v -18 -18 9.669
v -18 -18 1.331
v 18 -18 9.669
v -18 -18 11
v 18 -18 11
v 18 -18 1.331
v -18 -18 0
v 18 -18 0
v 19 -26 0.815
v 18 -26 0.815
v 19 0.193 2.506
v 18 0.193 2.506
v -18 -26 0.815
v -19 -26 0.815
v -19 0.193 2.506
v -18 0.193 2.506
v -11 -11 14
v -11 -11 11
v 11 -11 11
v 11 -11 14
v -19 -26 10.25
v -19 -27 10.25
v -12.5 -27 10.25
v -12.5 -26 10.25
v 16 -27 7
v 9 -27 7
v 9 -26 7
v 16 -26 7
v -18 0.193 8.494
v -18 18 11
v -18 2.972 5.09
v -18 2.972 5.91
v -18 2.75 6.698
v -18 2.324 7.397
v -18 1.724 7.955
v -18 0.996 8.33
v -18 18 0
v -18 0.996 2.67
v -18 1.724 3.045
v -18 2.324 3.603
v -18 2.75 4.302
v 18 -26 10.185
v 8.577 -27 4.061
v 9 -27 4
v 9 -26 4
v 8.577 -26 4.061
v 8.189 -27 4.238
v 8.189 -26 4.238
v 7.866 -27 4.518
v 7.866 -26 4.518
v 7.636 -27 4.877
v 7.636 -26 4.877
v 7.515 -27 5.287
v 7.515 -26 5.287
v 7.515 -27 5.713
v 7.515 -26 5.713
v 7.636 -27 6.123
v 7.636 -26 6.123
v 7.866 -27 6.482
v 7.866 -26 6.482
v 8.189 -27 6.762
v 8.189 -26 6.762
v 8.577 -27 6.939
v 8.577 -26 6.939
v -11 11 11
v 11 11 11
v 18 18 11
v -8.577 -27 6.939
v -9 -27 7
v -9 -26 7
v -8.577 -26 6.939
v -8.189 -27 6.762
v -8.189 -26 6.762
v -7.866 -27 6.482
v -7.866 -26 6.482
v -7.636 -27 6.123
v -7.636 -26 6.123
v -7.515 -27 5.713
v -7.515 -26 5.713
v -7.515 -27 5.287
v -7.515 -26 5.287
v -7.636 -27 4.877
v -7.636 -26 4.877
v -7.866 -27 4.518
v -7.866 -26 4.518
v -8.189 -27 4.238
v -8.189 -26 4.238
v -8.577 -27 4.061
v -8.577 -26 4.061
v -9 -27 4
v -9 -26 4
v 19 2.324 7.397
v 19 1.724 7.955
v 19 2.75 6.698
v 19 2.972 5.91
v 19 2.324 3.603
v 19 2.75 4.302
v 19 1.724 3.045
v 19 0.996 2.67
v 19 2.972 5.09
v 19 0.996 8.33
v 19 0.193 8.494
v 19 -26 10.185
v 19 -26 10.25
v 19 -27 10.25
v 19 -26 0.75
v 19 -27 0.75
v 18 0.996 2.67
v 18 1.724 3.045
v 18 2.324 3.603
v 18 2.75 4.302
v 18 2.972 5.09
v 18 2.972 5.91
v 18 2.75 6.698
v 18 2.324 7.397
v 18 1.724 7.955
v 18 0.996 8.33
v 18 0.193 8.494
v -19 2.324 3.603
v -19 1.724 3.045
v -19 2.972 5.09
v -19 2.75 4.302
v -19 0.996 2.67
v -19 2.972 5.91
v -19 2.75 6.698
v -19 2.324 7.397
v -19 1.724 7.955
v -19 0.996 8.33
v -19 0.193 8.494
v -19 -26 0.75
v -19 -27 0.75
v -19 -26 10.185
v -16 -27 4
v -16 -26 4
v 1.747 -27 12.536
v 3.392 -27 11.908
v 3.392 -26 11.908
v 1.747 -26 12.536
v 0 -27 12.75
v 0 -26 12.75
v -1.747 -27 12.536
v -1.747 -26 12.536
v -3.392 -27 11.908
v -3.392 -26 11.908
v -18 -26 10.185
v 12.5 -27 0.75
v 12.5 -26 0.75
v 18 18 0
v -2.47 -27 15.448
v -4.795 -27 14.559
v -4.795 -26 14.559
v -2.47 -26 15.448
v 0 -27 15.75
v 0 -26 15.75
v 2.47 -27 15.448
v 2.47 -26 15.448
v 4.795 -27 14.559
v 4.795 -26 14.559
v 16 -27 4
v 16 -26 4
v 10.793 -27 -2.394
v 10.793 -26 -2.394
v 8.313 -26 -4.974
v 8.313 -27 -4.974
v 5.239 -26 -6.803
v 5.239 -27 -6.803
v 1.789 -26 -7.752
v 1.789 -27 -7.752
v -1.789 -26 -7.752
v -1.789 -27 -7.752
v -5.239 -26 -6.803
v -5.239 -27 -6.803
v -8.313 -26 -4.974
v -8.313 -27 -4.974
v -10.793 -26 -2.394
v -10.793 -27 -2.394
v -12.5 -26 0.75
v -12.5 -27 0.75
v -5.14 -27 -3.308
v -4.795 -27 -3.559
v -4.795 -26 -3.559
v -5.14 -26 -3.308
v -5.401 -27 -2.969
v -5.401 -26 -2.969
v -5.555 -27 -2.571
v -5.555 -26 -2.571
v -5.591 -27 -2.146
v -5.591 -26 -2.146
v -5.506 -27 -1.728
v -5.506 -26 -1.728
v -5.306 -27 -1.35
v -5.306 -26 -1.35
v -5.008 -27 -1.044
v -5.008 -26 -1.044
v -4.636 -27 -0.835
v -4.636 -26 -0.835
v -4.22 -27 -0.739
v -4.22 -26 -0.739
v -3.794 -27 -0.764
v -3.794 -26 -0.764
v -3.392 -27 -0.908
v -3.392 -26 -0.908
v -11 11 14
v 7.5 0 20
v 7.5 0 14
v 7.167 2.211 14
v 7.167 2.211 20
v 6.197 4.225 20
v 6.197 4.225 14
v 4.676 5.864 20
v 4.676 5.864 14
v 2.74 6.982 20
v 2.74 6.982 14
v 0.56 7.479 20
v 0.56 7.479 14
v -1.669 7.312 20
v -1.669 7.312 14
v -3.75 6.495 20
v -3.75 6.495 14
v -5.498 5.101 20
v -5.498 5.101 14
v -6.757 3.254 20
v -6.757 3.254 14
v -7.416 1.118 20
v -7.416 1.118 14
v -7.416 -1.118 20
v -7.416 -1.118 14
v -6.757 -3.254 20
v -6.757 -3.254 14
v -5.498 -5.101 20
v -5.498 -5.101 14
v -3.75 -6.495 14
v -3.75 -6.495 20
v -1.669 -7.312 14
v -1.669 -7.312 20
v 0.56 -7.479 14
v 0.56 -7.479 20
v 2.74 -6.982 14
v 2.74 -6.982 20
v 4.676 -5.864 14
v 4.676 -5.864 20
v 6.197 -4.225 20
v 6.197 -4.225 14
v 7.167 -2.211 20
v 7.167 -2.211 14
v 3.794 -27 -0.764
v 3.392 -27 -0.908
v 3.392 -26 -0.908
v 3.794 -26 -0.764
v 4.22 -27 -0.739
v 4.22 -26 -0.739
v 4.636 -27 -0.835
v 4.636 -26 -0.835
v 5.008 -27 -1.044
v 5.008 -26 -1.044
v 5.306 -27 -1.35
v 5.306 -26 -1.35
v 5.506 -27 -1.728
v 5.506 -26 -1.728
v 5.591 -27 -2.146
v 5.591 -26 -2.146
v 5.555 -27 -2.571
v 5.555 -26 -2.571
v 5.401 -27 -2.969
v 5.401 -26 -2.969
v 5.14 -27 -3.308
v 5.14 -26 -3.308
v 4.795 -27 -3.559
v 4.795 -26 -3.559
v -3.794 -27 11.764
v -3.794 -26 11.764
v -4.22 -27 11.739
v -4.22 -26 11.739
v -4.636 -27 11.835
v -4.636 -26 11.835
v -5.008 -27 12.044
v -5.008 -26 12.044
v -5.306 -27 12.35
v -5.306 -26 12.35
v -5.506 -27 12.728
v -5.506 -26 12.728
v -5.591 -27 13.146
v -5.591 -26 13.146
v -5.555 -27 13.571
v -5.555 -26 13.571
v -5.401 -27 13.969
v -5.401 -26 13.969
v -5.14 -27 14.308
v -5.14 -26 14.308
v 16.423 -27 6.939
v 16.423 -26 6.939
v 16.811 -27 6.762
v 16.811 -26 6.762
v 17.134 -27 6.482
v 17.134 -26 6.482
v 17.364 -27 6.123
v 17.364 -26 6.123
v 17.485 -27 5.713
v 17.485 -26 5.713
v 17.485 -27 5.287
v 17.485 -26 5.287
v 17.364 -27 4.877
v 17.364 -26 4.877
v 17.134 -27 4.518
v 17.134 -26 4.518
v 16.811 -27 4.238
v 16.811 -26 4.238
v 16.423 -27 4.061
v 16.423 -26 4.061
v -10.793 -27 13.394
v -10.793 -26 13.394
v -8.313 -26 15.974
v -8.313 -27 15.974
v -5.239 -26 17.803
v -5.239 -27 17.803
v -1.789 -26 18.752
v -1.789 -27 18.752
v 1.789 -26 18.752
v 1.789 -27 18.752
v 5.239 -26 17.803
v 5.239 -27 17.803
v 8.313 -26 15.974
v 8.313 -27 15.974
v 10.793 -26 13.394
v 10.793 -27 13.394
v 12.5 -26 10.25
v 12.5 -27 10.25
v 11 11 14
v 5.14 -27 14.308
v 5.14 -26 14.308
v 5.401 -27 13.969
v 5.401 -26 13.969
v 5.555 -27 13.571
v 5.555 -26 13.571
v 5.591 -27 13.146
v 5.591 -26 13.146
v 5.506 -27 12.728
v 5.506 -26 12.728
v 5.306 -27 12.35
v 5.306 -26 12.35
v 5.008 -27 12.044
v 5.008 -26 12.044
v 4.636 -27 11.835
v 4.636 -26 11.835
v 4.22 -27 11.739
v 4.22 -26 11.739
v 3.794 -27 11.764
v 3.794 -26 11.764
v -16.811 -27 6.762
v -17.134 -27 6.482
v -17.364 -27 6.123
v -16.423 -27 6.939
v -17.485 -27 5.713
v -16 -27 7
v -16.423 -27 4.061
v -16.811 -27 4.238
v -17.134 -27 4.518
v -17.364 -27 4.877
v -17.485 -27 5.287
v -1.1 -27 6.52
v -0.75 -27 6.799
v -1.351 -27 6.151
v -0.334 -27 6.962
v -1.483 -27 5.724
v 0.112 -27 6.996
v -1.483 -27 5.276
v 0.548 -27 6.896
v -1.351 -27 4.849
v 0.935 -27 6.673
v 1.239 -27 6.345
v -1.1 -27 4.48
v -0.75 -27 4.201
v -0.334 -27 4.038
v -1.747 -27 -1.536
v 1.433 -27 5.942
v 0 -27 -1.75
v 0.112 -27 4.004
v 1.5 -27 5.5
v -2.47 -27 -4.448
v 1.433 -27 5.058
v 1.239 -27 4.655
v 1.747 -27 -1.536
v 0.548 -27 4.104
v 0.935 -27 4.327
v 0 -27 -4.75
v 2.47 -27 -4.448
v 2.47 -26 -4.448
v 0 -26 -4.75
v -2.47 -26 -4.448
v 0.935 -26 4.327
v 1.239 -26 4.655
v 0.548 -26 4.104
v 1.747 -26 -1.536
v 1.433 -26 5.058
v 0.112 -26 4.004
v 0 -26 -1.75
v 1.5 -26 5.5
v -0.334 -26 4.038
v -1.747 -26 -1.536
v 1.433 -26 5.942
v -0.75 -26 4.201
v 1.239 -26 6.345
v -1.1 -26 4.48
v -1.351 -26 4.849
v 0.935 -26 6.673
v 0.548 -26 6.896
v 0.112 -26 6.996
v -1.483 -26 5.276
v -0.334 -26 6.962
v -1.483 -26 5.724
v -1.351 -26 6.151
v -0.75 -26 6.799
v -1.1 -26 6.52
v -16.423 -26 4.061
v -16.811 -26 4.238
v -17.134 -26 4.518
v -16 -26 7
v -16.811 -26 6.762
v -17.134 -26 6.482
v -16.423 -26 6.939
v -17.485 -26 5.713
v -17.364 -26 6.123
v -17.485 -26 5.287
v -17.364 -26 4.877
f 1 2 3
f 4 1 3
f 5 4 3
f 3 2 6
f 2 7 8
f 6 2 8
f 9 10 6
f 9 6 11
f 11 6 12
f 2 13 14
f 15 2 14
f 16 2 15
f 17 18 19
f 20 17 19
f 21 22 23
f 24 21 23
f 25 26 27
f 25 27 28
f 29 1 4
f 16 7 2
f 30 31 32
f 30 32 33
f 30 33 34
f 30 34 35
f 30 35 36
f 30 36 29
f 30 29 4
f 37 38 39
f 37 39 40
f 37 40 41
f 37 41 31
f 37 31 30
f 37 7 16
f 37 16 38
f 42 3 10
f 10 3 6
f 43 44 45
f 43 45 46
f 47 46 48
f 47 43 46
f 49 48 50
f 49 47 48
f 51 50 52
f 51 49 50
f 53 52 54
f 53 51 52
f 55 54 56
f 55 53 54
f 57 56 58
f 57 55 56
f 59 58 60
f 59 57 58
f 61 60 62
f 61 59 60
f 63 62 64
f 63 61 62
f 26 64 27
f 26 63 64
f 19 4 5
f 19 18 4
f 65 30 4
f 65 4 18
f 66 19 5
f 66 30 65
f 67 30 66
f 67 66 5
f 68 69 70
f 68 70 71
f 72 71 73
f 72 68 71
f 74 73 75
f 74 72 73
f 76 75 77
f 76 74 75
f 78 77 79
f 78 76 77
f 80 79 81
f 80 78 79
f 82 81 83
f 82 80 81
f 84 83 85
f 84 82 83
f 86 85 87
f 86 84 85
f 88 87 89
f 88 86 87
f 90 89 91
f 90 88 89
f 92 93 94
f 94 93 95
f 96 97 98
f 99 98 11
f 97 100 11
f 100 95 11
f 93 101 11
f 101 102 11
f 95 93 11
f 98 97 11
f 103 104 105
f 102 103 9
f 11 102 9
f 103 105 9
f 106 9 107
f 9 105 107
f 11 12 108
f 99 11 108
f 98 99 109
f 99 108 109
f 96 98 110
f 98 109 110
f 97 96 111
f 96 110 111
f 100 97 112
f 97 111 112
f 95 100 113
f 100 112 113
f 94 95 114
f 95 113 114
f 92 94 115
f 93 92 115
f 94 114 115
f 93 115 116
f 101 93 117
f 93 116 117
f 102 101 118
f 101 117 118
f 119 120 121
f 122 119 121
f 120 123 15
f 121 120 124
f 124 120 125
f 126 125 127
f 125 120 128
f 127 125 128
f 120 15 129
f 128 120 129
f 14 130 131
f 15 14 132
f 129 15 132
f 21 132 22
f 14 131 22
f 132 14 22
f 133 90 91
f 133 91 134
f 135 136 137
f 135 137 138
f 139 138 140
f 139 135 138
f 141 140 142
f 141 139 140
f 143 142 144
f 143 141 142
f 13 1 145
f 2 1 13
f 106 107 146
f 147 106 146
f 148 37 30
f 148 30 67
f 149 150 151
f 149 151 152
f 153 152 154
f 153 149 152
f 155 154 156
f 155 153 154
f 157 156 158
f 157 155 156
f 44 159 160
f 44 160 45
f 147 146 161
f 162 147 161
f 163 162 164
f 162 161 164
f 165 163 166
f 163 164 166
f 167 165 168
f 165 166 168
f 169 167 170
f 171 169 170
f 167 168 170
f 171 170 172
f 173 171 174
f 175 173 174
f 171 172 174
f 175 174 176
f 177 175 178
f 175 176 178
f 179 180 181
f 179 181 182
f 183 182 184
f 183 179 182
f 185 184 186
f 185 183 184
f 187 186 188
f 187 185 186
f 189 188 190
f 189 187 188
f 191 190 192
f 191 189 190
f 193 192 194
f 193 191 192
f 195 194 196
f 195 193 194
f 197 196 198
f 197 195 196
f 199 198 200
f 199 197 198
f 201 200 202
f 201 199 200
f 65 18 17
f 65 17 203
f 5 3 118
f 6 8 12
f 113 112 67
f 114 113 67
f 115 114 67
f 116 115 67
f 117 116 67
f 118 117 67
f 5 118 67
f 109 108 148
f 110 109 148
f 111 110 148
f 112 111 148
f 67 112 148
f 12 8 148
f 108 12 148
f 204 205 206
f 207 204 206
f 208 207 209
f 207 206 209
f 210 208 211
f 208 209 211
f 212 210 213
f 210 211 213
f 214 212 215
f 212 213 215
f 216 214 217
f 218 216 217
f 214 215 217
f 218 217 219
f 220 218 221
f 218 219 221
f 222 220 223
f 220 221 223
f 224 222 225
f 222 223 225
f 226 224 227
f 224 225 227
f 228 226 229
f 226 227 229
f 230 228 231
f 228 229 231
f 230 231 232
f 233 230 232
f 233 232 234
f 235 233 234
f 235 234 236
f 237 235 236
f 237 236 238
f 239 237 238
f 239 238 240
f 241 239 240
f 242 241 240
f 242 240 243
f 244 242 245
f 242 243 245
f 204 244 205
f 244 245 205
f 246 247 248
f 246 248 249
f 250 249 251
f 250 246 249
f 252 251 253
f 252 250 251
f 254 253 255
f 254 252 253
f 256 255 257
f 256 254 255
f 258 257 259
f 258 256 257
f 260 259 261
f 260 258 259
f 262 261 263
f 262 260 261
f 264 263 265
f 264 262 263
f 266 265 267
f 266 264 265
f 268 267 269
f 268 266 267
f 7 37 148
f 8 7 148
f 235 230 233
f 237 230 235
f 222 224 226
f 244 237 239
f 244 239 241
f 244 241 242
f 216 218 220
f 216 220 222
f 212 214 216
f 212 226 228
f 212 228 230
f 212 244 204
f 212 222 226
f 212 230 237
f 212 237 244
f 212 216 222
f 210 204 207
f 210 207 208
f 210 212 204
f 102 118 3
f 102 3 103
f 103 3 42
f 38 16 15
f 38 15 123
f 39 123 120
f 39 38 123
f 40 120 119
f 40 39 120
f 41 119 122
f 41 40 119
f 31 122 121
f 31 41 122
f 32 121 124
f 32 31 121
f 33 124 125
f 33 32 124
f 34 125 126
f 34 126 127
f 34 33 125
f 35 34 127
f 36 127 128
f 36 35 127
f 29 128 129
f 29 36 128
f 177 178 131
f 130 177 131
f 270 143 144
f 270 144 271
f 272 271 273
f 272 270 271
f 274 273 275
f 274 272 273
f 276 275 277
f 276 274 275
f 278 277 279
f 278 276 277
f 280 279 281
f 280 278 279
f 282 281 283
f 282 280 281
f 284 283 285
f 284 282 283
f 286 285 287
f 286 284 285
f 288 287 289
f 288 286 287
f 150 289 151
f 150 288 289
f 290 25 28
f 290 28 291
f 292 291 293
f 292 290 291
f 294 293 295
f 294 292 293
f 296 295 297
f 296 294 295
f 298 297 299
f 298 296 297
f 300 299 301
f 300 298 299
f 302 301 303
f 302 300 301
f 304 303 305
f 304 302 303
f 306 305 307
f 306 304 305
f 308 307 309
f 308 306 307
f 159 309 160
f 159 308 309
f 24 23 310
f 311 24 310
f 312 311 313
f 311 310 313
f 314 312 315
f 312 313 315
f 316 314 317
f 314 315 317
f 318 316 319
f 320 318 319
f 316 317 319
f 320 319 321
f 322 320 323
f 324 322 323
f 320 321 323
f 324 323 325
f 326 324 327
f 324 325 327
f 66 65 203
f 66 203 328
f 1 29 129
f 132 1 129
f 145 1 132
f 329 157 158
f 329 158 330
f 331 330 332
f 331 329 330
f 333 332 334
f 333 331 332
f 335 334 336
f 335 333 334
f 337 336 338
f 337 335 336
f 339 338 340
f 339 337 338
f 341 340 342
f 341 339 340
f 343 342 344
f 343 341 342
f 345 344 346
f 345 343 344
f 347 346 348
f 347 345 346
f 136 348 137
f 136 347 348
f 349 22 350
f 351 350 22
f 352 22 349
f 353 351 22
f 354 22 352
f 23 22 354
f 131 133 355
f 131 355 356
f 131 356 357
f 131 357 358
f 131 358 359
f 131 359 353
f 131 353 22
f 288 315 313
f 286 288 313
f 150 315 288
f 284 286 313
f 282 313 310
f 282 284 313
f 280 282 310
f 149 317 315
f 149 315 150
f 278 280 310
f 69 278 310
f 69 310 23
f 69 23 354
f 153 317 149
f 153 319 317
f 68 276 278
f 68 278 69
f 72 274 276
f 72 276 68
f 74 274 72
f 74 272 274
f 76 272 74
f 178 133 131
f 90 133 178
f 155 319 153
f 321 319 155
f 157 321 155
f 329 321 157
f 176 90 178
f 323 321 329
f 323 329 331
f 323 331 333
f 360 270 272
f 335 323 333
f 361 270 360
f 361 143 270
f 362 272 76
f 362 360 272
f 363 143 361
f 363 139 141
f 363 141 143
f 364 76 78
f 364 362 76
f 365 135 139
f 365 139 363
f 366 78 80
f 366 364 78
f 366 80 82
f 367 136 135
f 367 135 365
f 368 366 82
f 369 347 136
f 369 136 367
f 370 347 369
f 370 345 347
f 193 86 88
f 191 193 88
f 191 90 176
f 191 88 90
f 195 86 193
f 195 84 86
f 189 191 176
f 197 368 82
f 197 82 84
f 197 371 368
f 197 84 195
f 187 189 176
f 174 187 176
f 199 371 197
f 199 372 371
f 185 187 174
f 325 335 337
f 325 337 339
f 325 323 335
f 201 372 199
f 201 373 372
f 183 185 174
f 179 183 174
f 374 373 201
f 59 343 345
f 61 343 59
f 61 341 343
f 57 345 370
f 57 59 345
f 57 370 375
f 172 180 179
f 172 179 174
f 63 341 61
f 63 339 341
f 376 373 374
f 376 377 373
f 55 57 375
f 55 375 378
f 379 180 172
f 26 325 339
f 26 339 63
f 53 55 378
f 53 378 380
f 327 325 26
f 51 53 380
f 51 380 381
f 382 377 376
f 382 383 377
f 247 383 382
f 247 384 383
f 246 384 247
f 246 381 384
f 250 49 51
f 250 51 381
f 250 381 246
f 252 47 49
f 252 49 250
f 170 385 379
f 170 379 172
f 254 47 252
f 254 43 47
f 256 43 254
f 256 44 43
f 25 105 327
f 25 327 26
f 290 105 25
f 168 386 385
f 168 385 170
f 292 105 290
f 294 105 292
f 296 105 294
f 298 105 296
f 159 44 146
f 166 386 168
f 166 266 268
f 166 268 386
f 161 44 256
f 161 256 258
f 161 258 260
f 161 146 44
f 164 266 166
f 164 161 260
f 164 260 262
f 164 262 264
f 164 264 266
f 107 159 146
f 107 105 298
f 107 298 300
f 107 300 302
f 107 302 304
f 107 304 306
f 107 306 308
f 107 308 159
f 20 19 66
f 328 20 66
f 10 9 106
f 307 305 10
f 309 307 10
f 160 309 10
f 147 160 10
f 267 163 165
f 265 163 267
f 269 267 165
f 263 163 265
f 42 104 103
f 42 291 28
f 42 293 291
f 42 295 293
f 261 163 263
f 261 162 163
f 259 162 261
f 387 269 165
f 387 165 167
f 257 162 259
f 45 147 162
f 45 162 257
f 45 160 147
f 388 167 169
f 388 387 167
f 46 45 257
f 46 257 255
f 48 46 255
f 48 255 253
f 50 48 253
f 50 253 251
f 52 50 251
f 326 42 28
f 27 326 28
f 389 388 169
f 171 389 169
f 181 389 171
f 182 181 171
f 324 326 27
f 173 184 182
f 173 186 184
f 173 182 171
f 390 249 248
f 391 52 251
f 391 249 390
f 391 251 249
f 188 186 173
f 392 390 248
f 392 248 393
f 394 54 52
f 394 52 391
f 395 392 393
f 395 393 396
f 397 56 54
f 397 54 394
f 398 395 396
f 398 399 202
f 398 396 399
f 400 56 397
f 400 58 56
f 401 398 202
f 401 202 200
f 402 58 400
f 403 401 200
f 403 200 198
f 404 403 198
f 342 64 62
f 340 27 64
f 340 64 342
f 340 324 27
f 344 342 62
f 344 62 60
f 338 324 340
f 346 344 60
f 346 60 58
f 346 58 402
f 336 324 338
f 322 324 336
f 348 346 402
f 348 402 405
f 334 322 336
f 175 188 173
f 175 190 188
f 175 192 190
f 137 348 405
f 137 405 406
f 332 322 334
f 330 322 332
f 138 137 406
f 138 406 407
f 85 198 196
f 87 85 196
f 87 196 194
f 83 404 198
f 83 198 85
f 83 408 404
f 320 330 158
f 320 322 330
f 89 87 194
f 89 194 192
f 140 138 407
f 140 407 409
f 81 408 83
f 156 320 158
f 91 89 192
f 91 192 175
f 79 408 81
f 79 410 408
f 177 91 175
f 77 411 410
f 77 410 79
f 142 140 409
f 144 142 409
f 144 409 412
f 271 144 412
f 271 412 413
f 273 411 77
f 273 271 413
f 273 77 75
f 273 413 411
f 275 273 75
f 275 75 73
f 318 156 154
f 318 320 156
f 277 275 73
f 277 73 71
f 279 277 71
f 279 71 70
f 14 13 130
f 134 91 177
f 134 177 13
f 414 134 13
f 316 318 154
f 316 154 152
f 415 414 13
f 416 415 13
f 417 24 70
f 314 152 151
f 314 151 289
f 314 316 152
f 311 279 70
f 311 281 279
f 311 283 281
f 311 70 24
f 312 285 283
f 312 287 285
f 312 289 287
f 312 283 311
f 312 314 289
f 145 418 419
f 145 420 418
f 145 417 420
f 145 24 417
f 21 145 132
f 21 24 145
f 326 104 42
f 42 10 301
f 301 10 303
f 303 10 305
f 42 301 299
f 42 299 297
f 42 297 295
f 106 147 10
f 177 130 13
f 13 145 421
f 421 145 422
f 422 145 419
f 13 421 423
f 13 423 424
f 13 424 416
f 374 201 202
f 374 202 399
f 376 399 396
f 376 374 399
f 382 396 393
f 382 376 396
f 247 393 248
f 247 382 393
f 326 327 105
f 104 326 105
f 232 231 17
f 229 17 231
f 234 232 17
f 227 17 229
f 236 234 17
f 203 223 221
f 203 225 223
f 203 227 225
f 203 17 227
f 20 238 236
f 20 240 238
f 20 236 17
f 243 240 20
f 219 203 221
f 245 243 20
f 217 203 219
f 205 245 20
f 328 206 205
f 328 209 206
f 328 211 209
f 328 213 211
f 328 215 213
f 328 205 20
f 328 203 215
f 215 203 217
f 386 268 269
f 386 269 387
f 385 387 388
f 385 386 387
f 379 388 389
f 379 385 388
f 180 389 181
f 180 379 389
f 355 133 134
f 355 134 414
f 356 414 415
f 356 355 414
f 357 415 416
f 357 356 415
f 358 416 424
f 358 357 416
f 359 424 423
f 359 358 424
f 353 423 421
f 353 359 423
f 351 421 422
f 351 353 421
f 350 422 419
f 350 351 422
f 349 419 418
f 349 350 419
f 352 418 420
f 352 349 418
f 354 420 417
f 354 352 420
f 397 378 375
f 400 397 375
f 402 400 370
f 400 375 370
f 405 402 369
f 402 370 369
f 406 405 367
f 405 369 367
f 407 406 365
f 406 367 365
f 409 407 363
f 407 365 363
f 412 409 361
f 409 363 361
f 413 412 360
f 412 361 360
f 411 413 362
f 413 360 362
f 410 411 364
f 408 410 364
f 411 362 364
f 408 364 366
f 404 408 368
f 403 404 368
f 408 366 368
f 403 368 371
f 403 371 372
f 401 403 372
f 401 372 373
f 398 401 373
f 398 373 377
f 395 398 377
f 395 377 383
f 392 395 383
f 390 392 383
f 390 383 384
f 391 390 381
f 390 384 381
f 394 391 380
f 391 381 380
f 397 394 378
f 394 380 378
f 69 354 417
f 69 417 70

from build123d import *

# Parameters (mm, degrees)
SKETCH_1_W          = 36
SKETCH_1_H          = 36
EXTRUDE_1_DEPTH     = 11
SKETCH_2_W          = 22
SKETCH_2_H          = 22
EXTRUDE_2_DEPTH     = 3
SKETCH_3_R          = 7.5
EXTRUDE_3_DEPTH     = 6
EXTRUDE_4_DEPTH     = 1
EXTRUDE_5_DEPTH     = 1
SKETCH_6_R          = 1.5
CUT_EXTRUDE_1_DEPTH = 1


with BuildPart() as part:
    # 草图1 → 凸台-拉伸1 (new body)
    with BuildSketch(Plane.XY):
        Rectangle(SKETCH_1_W, SKETCH_1_H)
    extrude(amount=EXTRUDE_1_DEPTH)

    # 草图2 → 凸台-拉伸2 (add)
    with BuildSketch(Plane.XY.offset(11)):
        Rectangle(SKETCH_2_W, SKETCH_2_H)
    extrude(amount=EXTRUDE_2_DEPTH)

    # 草图3 → 凸台-拉伸3 (add)
    with BuildSketch(Plane.XY.offset(14)):
        Circle(SKETCH_3_R)
    extrude(amount=EXTRUDE_3_DEPTH)

    # 草图4 → 凸台-拉伸4 (add)
    with BuildSketch(Plane(origin=(18, 0, 0), x_dir=(0, 0, -1), z_dir=(1, 0, 0))):
        with BuildLine():
            Line((-8.493762994, 0.193347193), (-10.25, -27))
            Line((-10.25, -27), (-0.75, -27))
            Line((-0.75, -27), (-2.506237006, 0.193347193))
            ThreePointArc((-2.506237006, 0.193347193), (-5.5, 3), (-8.493762994, 0.193347193))
        make_face()
    extrude_4 = extrude(amount=EXTRUDE_4_DEPTH)

    # 镜向1: 凸台-拉伸4 across plane
    add(extrude_4.mirror(Plane(origin=(0, 0, 0), x_dir=(0, 0, 1), z_dir=(1, 0, 0))))

    # 草图5 → 凸台-拉伸5 (add)
    with BuildSketch(Plane.XZ.offset(27)):
        with BuildLine():
            Line((-19, 10.25), (-12.5, 10.25))
            ThreePointArc((-12.5, 10.25), (0, 18.87207912), (12.5, 10.25))
            Line((12.5, 10.25), (19, 10.25))
            Line((19, 10.25), (19, 0.75))
            Line((19, 0.75), (12.5, 0.75))
            ThreePointArc((12.5, 0.75), (0, -7.87207912), (-12.5, 0.75))
            Line((-12.5, 0.75), (-19, 0.75))
            Line((-19, 0.75), (-19, 10.25))
        make_face()
    extrude(amount=-EXTRUDE_5_DEPTH)

    # 草图6 → 切除-拉伸1 (cut)
    with BuildSketch(Plane.XZ.offset(27)):
        with Locations((0, 5.5)):
            Circle(SKETCH_6_R)
        with BuildLine():
            Line((-16, 7), (-9, 7))
            ThreePointArc((-9, 7), (-7.5, 5.5), (-9, 4))
            Line((-9, 4), (-16, 4))
            ThreePointArc((-16, 4), (-17.5, 5.5), (-16, 7))
        make_face()
        with BuildLine():
            Line((9, 7), (16, 7))
            ThreePointArc((16, 7), (17.5, 5.5), (16, 4))
            Line((16, 4), (9, 4))
            ThreePointArc((9, 4), (7.5, 5.5), (9, 7))
        make_face()
        with BuildLine():
            ThreePointArc((-4.79529689, 14.55926341), (0, 15.750128087), (4.79529689, 14.55926341))
            ThreePointArc((4.79529689, 14.55926341), (5.419284193, 12.531792117), (3.3918129, 11.907804814))
            ThreePointArc((3.3918129, 11.907804814), (0, 12.750128087), (-3.3918129, 11.907804814))
            ThreePointArc((-3.3918129, 11.907804814), (-5.419284193, 12.531792117), (-4.79529689, 14.55926341))
        make_face()
        with BuildLine():
            ThreePointArc((-4.79529689, -3.55926341), (-5.419284193, -1.531792117), (-3.3918129, -0.907804814))
            ThreePointArc((-3.3918129, -0.907804814), (0, -1.750128087), (3.3918129, -0.907804814))
            ThreePointArc((3.3918129, -0.907804814), (5.419284193, -1.531792117), (4.79529689, -3.55926341))
            ThreePointArc((4.79529689, -3.55926341), (0, -4.750128087), (-4.79529689, -3.55926341))
        make_face()
    extrude(amount=-CUT_EXTRUDE_1_DEPTH, mode=Mode.SUBTRACT)


solid = part.part
